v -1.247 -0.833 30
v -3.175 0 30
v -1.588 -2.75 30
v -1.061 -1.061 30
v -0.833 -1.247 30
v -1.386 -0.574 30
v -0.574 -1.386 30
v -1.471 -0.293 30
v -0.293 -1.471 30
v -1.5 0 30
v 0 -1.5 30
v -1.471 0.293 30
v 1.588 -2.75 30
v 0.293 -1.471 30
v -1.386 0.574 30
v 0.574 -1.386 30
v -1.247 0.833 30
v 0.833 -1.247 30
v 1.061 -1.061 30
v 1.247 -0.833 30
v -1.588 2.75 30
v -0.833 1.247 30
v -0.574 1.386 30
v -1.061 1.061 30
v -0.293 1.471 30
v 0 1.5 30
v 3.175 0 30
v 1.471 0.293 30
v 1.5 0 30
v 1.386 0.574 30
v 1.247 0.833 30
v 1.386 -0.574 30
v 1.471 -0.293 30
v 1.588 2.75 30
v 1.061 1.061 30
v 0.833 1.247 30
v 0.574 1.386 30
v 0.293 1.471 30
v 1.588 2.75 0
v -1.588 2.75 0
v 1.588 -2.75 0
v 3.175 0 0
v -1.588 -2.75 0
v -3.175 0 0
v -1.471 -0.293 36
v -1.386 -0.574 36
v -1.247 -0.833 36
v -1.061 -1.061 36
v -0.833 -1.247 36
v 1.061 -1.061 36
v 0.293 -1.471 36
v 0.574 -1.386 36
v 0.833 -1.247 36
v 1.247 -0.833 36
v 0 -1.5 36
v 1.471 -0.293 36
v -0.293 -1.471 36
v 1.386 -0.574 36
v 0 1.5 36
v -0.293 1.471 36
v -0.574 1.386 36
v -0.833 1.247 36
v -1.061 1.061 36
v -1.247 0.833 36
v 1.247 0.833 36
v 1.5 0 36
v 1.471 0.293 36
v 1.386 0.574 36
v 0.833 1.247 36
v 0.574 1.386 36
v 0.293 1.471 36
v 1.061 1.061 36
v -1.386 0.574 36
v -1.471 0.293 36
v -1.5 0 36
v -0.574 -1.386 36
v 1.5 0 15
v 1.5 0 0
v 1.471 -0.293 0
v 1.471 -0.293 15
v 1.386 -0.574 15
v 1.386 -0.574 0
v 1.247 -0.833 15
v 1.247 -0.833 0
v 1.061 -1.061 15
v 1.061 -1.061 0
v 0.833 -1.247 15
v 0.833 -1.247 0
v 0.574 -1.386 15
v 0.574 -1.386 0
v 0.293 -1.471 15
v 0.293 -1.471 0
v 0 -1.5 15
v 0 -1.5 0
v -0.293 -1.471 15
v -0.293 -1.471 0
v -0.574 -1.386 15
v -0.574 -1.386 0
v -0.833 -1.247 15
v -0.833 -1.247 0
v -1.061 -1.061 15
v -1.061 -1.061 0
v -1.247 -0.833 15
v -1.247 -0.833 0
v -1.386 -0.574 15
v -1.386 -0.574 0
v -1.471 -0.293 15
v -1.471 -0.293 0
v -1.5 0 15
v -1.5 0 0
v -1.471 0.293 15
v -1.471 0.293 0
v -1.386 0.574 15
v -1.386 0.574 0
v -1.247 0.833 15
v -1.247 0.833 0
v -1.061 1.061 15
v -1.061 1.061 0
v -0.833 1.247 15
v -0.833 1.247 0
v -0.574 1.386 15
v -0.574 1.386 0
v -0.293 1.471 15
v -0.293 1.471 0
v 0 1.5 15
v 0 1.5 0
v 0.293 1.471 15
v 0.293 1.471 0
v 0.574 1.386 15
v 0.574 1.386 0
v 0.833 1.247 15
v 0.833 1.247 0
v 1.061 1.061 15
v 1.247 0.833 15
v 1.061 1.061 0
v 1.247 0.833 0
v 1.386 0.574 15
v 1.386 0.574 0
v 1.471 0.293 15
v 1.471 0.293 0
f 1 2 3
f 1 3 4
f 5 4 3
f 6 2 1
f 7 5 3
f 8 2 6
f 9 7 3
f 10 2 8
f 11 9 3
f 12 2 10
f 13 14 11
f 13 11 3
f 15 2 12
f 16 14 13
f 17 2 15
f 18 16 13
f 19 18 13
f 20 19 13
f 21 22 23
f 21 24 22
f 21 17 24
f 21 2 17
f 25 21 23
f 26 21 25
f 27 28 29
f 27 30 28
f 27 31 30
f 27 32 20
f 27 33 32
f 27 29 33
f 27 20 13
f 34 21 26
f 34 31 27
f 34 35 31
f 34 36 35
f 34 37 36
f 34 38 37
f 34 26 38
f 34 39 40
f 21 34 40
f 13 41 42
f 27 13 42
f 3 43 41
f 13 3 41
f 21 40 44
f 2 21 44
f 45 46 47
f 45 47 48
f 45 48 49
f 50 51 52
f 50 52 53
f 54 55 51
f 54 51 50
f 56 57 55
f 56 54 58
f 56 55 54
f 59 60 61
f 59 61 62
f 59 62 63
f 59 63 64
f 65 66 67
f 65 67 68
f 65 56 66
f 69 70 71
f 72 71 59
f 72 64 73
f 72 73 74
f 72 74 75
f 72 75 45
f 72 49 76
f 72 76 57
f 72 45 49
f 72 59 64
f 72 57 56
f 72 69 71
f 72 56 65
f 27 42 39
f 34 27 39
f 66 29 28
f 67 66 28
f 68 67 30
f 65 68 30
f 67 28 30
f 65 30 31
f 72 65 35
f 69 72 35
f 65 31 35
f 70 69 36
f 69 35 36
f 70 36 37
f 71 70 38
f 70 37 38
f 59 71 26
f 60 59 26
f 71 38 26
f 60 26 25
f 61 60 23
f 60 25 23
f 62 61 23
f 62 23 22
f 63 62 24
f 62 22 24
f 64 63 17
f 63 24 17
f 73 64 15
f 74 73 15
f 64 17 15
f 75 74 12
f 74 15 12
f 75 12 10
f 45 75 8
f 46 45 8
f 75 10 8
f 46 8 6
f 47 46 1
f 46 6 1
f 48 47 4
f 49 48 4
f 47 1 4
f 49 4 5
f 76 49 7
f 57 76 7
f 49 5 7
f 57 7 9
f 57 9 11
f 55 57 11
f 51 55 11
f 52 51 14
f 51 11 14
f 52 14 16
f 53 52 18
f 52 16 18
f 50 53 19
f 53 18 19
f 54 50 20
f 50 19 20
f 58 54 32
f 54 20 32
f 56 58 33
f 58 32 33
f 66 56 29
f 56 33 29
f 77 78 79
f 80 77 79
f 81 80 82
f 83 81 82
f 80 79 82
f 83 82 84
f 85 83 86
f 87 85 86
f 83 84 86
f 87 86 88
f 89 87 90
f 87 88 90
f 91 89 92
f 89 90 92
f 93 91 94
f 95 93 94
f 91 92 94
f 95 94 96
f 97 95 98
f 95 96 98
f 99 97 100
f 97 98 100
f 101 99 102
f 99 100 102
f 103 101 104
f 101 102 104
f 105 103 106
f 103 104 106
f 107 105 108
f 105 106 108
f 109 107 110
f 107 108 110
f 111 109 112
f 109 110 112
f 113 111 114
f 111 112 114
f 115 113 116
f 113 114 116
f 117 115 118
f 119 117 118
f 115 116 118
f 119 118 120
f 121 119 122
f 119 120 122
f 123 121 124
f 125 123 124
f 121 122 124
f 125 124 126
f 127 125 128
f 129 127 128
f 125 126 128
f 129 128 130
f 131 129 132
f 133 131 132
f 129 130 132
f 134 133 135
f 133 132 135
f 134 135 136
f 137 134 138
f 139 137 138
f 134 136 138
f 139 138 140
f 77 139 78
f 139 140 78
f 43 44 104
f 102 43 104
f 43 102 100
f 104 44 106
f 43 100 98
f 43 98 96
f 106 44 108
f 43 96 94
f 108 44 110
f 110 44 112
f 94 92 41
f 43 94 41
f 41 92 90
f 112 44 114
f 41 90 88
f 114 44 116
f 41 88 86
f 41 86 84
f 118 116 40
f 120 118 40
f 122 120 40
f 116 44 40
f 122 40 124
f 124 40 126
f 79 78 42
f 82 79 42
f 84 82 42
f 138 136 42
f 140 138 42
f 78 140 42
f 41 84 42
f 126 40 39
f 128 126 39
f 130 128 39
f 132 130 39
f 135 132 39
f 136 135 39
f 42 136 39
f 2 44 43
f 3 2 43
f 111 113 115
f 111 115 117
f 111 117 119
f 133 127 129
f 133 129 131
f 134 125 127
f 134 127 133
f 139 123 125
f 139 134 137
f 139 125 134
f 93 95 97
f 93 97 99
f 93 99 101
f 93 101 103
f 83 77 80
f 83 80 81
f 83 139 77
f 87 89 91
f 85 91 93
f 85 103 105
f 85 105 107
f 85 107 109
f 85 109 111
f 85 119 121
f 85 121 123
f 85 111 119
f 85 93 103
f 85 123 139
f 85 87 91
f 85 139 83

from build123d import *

# Parameters (mm, degrees)
PAD_DEPTH    = 30
SKETCH001_R  = 1.5
PAD001_DEPTH = 6
SKETCH002_R  = 1.5
POCKET_DEPTH = 15


with BuildPart() as part:
    # Sketch → Pad (new body)
    with BuildSketch(Plane.XY):
        Polygon((1.587713, -2.75), (3.175426, 0), (1.587713, 2.75), (-1.587713, 2.75), (-3.175426, 0), (-1.587713, -2.75), align=None)
    extrude(amount=PAD_DEPTH)

    # Sketch001 (on Face8 of Pad) → Pad001 (join)
    with BuildSketch(Plane.XY.offset(30)):
        Circle(SKETCH001_R)
    extrude(amount=PAD001_DEPTH)

    # Sketch002 (on Face4 of Pad001) → Pocket (cut)
    with BuildSketch(Plane(origin=(0, 0, 0), x_dir=(1, 0, 0), z_dir=(0, 0, -1))):
        Circle(SKETCH002_R)
    extrude(amount=-POCKET_DEPTH, mode=Mode.SUBTRACT)


solid = part.part
